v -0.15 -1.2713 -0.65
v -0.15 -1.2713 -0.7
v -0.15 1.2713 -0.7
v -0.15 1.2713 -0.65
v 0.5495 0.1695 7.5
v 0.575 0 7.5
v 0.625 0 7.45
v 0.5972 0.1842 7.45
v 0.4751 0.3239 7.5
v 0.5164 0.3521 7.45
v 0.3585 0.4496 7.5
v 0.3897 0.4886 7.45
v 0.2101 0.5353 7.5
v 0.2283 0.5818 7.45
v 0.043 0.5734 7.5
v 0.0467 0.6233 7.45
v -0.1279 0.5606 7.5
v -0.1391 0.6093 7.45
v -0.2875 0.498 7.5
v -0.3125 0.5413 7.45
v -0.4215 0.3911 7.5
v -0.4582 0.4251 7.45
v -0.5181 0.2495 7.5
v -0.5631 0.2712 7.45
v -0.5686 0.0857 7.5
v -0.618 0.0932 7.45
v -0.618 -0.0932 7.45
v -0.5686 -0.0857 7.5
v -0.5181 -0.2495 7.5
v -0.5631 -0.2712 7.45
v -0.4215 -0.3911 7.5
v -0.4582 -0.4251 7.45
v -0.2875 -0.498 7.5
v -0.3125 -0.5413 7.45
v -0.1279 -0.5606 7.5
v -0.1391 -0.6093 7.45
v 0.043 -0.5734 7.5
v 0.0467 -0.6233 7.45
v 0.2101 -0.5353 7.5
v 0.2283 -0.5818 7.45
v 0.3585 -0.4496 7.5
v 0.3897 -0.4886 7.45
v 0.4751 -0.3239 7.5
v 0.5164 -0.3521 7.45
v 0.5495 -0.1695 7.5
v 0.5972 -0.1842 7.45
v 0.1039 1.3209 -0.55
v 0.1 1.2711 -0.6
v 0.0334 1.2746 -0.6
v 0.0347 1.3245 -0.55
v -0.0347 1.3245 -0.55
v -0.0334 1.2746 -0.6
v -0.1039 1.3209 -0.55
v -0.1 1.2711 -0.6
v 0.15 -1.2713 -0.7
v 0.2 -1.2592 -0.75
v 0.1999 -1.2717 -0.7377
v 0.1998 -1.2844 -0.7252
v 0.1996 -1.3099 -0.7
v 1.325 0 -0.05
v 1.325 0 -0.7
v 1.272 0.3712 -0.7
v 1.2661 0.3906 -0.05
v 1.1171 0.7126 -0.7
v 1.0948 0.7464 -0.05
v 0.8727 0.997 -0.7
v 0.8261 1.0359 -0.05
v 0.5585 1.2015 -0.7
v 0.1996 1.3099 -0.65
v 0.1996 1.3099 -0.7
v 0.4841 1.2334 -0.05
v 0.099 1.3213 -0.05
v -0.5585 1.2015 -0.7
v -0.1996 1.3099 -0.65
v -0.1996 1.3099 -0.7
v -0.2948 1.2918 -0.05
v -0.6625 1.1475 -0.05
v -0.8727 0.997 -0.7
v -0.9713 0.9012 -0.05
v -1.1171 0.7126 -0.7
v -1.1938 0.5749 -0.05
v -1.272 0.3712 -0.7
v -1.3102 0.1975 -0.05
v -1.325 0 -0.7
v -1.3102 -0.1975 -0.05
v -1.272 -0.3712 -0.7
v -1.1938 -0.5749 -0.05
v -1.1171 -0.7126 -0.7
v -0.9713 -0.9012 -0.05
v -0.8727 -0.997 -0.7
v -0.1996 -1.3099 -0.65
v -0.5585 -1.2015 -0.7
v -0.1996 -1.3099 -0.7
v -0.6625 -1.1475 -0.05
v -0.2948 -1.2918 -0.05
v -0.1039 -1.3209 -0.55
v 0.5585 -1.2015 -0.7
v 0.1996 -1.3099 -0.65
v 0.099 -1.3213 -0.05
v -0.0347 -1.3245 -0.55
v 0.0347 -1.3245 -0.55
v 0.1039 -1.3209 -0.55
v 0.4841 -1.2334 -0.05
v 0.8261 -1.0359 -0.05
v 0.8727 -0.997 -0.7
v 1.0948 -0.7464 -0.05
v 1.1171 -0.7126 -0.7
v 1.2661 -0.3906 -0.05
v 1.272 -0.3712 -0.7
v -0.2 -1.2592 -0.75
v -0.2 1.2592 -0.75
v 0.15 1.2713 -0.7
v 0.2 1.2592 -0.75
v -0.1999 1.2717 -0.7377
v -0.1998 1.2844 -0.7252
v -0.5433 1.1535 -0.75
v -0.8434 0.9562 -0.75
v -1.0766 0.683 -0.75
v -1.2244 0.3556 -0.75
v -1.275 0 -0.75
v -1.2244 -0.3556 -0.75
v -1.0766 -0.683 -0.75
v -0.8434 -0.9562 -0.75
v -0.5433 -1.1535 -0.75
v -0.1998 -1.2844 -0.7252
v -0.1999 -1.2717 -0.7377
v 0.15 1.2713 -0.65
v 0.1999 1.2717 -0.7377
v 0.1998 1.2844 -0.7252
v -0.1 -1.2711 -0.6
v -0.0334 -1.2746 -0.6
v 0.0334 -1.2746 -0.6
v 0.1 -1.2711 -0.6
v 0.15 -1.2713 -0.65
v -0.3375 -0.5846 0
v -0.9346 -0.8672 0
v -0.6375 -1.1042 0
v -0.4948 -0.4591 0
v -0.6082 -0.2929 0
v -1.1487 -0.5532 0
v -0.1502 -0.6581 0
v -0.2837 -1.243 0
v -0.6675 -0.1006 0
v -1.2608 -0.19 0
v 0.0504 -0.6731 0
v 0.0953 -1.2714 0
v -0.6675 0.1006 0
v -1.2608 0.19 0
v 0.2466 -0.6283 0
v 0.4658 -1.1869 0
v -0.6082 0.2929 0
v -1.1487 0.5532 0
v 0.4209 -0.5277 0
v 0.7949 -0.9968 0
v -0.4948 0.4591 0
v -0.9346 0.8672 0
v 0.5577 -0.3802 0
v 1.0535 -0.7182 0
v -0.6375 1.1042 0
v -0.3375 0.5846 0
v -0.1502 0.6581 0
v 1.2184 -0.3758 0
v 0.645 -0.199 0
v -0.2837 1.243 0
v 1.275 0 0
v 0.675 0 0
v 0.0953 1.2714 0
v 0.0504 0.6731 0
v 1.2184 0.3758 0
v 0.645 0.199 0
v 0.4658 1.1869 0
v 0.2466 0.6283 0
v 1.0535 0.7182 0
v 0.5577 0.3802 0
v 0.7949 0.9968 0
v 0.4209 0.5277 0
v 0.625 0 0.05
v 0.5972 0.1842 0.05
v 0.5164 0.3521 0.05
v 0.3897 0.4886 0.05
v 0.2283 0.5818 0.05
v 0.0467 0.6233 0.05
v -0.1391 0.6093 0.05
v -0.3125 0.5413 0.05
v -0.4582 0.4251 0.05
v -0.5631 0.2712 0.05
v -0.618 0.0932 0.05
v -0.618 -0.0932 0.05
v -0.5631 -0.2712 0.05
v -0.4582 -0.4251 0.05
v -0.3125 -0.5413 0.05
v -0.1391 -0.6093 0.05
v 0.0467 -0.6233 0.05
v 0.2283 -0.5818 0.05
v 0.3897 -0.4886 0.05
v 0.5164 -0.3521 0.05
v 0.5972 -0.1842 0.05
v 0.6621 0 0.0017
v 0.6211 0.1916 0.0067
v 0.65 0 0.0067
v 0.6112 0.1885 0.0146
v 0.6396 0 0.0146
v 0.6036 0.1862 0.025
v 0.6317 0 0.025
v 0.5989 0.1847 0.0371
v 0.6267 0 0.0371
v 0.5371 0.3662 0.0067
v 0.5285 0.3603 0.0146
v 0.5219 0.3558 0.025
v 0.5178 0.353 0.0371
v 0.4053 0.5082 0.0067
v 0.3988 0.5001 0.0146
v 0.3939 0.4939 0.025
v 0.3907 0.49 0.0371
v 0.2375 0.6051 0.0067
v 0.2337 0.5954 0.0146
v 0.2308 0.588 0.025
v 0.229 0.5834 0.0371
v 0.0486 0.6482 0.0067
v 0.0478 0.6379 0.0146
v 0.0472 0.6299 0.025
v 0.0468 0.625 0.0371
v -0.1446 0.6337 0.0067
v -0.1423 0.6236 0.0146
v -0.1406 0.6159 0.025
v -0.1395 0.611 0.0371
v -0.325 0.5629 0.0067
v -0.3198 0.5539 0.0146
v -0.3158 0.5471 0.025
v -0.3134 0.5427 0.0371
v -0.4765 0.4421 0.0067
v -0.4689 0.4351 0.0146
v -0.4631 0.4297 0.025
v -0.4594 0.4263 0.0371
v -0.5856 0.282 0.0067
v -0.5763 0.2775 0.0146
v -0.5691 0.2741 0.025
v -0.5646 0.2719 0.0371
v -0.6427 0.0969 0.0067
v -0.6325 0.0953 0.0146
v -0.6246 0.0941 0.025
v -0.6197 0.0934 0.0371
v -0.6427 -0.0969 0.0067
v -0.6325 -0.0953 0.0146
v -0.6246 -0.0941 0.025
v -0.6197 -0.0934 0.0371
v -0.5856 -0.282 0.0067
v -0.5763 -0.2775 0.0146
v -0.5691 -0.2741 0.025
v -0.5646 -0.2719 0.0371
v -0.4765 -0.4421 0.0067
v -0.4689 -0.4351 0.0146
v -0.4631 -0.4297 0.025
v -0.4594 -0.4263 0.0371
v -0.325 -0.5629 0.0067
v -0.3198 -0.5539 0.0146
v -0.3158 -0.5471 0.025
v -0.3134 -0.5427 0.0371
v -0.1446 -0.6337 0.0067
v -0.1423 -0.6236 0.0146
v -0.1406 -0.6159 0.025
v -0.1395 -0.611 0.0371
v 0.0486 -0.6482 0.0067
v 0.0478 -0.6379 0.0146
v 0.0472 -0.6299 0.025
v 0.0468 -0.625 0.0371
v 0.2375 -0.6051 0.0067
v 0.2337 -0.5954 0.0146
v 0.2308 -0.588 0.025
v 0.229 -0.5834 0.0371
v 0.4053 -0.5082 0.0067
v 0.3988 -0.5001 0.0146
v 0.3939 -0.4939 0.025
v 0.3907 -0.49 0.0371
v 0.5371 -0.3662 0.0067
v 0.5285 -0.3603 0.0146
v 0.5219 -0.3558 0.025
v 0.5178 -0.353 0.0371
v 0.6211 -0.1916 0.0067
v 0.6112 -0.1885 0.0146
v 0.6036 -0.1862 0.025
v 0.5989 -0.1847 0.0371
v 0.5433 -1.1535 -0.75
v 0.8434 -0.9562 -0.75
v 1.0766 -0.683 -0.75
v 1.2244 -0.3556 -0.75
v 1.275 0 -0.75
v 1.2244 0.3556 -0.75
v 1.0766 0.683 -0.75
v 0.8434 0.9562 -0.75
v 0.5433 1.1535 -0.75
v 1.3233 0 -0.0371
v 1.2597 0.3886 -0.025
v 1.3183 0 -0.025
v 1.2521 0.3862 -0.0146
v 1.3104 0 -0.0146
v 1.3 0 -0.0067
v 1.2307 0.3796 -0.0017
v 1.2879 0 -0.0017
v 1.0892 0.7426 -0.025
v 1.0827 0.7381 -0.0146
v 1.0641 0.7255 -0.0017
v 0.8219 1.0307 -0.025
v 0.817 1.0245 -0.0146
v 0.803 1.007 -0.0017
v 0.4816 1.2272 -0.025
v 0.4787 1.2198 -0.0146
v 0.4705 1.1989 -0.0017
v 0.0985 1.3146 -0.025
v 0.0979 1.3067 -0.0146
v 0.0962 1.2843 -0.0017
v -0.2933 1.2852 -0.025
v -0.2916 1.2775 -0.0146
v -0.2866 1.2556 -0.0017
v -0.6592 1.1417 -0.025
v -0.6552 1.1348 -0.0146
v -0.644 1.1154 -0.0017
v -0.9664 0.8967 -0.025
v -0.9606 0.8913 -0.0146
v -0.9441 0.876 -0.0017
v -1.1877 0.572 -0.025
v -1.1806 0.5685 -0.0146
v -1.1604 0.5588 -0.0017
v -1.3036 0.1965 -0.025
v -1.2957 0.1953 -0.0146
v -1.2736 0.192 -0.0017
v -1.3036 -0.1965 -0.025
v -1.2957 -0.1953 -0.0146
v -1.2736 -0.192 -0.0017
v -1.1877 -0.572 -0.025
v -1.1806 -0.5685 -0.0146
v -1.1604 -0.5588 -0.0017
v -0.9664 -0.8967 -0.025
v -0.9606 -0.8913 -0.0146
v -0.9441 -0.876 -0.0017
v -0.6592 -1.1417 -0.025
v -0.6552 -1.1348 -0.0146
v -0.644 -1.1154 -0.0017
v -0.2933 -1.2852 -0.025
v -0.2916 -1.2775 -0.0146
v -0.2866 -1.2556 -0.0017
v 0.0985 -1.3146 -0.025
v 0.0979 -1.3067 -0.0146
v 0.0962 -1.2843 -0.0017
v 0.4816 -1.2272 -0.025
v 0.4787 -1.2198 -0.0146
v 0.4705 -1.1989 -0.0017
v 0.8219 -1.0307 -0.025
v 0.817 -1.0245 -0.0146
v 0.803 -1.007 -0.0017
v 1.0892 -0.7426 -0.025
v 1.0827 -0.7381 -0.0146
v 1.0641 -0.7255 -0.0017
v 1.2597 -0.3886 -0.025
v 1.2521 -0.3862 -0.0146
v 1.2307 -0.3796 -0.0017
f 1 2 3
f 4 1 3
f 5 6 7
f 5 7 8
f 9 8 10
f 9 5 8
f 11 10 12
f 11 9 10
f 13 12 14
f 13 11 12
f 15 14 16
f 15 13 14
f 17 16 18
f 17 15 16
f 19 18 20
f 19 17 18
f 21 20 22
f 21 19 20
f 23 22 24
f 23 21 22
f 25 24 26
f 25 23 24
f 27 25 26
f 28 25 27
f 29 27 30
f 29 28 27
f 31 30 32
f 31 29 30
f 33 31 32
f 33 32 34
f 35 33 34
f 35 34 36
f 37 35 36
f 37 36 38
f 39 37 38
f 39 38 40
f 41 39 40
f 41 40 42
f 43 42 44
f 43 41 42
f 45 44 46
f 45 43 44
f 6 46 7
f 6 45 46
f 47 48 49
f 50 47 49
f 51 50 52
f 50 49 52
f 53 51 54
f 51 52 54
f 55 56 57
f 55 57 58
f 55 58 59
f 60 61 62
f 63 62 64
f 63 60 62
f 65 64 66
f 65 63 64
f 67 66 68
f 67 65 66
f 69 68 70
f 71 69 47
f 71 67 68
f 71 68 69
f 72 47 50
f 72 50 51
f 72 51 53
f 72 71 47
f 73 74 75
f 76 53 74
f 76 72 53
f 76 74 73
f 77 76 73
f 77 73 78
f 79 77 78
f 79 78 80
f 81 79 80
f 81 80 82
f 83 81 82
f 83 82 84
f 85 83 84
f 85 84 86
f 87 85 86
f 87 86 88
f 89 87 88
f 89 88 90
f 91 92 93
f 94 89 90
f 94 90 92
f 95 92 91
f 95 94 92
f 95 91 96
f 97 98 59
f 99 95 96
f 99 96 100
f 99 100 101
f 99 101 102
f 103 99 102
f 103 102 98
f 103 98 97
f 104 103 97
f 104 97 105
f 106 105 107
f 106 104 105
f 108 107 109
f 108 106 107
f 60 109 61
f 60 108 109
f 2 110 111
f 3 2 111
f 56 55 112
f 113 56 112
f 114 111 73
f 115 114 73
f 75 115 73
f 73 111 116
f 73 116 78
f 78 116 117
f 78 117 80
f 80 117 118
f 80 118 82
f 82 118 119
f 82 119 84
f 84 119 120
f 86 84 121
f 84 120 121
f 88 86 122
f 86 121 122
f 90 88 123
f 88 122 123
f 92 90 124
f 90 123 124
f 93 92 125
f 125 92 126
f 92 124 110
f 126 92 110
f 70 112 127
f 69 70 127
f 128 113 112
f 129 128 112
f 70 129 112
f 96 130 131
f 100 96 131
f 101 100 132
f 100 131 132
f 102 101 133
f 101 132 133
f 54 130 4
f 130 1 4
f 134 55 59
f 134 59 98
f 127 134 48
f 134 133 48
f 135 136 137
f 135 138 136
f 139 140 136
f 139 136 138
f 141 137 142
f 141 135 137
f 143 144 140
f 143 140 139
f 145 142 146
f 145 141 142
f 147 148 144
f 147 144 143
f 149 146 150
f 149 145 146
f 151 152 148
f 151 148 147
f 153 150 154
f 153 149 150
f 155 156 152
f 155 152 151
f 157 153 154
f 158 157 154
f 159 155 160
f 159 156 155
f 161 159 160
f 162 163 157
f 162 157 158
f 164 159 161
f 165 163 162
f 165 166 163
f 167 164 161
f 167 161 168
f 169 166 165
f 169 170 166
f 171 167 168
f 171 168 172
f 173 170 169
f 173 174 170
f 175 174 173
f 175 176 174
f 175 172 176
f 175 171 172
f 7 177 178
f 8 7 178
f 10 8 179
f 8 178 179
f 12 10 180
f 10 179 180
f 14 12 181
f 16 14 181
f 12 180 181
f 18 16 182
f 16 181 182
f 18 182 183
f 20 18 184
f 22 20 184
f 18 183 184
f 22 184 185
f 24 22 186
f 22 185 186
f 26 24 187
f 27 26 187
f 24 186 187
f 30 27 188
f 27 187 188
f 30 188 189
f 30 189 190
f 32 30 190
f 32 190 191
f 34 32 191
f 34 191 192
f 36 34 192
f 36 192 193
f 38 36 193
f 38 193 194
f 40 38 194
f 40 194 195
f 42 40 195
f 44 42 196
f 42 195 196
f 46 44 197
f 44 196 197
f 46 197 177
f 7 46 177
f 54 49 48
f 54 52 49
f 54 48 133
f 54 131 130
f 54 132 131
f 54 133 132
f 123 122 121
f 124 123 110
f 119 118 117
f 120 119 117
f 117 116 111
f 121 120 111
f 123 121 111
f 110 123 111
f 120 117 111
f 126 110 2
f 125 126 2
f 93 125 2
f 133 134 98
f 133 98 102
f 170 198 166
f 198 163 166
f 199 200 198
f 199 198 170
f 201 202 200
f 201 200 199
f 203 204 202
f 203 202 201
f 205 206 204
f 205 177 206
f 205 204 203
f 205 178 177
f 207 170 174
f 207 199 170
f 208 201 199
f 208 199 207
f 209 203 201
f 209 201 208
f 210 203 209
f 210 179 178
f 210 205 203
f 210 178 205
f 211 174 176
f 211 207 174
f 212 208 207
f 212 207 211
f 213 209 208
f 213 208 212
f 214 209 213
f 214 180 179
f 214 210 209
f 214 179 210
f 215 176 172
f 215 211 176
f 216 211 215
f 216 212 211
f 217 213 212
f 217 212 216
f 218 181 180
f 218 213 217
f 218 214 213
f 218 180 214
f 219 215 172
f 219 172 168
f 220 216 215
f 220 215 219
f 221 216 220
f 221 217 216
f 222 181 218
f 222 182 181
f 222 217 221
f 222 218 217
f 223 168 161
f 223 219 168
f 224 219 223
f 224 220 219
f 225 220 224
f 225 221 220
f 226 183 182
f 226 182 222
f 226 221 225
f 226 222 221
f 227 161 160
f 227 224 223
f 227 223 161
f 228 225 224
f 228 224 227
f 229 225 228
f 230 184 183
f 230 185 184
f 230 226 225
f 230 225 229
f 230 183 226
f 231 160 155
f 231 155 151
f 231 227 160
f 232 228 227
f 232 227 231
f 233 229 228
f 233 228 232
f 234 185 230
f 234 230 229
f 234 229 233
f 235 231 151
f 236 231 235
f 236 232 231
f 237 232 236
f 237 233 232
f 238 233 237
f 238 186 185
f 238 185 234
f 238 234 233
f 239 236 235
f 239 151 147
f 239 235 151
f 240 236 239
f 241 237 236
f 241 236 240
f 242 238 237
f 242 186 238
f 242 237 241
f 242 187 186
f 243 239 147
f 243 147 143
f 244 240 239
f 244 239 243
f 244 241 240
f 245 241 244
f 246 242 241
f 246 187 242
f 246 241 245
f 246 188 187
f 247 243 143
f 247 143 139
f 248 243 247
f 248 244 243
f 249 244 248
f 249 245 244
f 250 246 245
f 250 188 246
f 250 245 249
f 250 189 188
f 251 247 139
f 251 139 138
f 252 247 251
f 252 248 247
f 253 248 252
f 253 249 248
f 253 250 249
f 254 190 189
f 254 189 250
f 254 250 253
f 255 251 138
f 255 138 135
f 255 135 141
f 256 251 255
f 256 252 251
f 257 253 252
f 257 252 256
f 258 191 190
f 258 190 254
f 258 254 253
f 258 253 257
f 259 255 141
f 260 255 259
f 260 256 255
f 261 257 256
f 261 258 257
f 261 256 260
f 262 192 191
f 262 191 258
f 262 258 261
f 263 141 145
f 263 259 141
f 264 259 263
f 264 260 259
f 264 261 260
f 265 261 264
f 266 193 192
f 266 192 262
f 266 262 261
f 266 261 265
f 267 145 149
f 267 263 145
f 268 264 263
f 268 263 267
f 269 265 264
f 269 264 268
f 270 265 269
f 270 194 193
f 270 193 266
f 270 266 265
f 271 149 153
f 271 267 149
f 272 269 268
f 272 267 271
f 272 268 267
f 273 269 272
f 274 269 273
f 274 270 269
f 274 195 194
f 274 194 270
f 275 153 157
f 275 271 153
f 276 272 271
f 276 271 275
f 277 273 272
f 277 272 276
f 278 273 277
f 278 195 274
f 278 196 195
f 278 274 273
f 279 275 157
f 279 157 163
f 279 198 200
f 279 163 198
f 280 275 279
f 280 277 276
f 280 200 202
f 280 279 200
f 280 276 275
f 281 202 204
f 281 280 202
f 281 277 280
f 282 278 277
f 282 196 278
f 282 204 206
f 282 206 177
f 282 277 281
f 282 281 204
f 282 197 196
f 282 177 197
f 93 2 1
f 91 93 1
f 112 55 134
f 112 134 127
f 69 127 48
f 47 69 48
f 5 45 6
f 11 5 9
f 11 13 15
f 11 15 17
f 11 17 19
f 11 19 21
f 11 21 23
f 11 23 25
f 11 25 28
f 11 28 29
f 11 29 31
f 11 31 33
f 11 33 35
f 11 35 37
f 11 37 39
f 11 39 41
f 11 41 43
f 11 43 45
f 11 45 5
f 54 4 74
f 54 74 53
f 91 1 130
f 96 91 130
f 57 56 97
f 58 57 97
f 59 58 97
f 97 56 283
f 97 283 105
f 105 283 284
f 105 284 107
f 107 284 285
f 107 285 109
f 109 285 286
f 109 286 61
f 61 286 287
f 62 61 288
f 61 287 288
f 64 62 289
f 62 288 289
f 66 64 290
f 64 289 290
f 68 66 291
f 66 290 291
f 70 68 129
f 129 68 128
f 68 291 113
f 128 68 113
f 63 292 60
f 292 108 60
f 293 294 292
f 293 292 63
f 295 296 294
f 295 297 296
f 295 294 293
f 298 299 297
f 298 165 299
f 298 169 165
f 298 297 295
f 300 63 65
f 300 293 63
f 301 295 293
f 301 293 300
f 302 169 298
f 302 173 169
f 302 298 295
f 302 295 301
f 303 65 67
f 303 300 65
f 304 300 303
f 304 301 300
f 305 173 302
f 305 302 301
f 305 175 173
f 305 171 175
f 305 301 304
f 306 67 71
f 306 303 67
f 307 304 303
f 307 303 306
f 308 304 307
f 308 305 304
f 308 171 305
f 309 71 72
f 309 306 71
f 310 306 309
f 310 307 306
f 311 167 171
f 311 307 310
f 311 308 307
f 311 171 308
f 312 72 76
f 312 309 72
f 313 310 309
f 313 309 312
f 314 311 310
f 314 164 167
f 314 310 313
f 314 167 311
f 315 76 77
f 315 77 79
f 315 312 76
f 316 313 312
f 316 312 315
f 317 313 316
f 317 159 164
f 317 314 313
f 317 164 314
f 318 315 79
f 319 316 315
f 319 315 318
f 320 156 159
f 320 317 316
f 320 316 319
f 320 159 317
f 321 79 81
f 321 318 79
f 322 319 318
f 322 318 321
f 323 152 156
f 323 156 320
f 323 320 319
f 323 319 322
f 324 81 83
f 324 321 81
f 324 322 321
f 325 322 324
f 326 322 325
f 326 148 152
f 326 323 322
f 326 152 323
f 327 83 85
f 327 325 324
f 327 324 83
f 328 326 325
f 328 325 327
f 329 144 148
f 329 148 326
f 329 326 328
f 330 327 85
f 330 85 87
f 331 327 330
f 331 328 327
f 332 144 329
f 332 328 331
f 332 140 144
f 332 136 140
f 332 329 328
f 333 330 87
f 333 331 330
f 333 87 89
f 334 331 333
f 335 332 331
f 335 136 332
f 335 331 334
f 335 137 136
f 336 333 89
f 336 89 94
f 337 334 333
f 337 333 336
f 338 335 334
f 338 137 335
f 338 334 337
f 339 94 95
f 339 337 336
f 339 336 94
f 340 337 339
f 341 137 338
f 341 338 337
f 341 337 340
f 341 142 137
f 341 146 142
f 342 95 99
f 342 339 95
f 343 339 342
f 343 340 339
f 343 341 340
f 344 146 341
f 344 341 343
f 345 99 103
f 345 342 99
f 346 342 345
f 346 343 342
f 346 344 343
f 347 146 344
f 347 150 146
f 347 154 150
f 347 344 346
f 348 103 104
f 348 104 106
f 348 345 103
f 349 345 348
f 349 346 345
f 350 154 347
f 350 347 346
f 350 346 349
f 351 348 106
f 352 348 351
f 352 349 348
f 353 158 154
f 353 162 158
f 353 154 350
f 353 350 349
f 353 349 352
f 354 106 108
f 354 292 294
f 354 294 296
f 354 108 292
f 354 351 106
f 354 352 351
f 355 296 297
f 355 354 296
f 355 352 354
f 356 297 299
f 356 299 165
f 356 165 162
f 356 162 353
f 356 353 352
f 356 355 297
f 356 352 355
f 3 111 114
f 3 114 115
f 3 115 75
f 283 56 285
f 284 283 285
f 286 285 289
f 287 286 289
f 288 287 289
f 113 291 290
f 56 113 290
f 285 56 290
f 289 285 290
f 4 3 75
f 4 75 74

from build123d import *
from OCP.BRepFilletAPI import BRepFilletAPI_MakeChamfer

# Parameters (mm, degrees)
SKETCH1_R           = 0.625
BOSS_EXTRUDE1_DEPTH = 7.5
SKETCH2_R           = 1.325
BOSS_EXTRUDE2_DEPTH = 0.75
SKETCH3_W           = 0.3
SKETCH3_H           = 7.682003158
CUT_EXTRUDE1_DEPTH  = 0.15
CHAMFER1_SIZE       = 0.05
CHAMFER1_SIZE2      = 0.045176141
FILLET1_R           = 0.05
CHAMFER2_SIZE       = 0.05


with BuildPart() as part:
    # Sketch1 → Boss-Extrude1 (new body)
    with BuildSketch(Plane.XY):
        Circle(SKETCH1_R)
    extrude(amount=BOSS_EXTRUDE1_DEPTH)

    # Sketch2 → Boss-Extrude2 (add)
    with BuildSketch(Plane.XY):
        Circle(SKETCH2_R)
    extrude(amount=-BOSS_EXTRUDE2_DEPTH)

    # Sketch3 → Cut-Extrude1 (cut)
    with BuildSketch(Plane(origin=(0, 0, -0.75), x_dir=(-1, 0, 0), z_dir=(0, 0, -1))):
        Rectangle(SKETCH3_W, SKETCH3_H)
    extrude(amount=-CUT_EXTRUDE1_DEPTH, mode=Mode.SUBTRACT)

    # Chamfer1: one chamfer whose edges measure the first distance from different faces: ONE call of the kernel's chamfer builder (chamfer() names one face for all edges)
    chamfer1_edges_1 = [part.edges().sort_by_distance(p)[0] for p in [
        (-1.325, 0, -0.75),
        (0.988527946, 0.882291052, -0.75),
        (-0.15, 0, -0.75),
        (0.15, 0, -0.75),
        (0, 1.325, -0.6),
        (0, -1.325, -0.6),
        (0.15, 0, -0.6),
        (-0.15, 0, -0.6),
    ]]
    chamfer1_edges_2 = [part.edges().sort_by_distance(p)[0] for p in [
        (0.15, 1.316482055, -0.675),
        (0.15, -1.316482055, -0.675),
        (-0.15, -1.316482055, -0.675),
        (-0.15, 1.316482055, -0.675),
    ]]
    chamfer1_side_2 = [part.faces().sort_by_distance(p)[0] for p in [
        (-1.325, 0, -0.375),
    ]]
    chamfer1 = BRepFilletAPI_MakeChamfer(part.part.solid().wrapped)
    for e in chamfer1_edges_1:
        chamfer1.Add(CHAMFER1_SIZE, e.wrapped)
    for e in chamfer1_edges_2:
        chamfer1.Add(CHAMFER1_SIZE, CHAMFER1_SIZE2, e.wrapped, chamfer1_side_2[0].wrapped)  # the first distance lies on this face
    add(Compound.cast(chamfer1.Shape()), mode=Mode.REPLACE)

    # Fillet1
    fillet1_edges = [part.edges().sort_by_distance(p)[0] for p in [
        (-0.625, 0, 0),
        (-1.325, 0, 0),
    ]]
    fillet(fillet1_edges, radius=FILLET1_R)

    # Chamfer2
    chamfer2_edges = [part.edges().sort_by_distance(p)[0] for p in [
        (-0.625, 0, 7.5),
    ]]
    chamfer(chamfer2_edges, length=CHAMFER2_SIZE)


solid = part.part
